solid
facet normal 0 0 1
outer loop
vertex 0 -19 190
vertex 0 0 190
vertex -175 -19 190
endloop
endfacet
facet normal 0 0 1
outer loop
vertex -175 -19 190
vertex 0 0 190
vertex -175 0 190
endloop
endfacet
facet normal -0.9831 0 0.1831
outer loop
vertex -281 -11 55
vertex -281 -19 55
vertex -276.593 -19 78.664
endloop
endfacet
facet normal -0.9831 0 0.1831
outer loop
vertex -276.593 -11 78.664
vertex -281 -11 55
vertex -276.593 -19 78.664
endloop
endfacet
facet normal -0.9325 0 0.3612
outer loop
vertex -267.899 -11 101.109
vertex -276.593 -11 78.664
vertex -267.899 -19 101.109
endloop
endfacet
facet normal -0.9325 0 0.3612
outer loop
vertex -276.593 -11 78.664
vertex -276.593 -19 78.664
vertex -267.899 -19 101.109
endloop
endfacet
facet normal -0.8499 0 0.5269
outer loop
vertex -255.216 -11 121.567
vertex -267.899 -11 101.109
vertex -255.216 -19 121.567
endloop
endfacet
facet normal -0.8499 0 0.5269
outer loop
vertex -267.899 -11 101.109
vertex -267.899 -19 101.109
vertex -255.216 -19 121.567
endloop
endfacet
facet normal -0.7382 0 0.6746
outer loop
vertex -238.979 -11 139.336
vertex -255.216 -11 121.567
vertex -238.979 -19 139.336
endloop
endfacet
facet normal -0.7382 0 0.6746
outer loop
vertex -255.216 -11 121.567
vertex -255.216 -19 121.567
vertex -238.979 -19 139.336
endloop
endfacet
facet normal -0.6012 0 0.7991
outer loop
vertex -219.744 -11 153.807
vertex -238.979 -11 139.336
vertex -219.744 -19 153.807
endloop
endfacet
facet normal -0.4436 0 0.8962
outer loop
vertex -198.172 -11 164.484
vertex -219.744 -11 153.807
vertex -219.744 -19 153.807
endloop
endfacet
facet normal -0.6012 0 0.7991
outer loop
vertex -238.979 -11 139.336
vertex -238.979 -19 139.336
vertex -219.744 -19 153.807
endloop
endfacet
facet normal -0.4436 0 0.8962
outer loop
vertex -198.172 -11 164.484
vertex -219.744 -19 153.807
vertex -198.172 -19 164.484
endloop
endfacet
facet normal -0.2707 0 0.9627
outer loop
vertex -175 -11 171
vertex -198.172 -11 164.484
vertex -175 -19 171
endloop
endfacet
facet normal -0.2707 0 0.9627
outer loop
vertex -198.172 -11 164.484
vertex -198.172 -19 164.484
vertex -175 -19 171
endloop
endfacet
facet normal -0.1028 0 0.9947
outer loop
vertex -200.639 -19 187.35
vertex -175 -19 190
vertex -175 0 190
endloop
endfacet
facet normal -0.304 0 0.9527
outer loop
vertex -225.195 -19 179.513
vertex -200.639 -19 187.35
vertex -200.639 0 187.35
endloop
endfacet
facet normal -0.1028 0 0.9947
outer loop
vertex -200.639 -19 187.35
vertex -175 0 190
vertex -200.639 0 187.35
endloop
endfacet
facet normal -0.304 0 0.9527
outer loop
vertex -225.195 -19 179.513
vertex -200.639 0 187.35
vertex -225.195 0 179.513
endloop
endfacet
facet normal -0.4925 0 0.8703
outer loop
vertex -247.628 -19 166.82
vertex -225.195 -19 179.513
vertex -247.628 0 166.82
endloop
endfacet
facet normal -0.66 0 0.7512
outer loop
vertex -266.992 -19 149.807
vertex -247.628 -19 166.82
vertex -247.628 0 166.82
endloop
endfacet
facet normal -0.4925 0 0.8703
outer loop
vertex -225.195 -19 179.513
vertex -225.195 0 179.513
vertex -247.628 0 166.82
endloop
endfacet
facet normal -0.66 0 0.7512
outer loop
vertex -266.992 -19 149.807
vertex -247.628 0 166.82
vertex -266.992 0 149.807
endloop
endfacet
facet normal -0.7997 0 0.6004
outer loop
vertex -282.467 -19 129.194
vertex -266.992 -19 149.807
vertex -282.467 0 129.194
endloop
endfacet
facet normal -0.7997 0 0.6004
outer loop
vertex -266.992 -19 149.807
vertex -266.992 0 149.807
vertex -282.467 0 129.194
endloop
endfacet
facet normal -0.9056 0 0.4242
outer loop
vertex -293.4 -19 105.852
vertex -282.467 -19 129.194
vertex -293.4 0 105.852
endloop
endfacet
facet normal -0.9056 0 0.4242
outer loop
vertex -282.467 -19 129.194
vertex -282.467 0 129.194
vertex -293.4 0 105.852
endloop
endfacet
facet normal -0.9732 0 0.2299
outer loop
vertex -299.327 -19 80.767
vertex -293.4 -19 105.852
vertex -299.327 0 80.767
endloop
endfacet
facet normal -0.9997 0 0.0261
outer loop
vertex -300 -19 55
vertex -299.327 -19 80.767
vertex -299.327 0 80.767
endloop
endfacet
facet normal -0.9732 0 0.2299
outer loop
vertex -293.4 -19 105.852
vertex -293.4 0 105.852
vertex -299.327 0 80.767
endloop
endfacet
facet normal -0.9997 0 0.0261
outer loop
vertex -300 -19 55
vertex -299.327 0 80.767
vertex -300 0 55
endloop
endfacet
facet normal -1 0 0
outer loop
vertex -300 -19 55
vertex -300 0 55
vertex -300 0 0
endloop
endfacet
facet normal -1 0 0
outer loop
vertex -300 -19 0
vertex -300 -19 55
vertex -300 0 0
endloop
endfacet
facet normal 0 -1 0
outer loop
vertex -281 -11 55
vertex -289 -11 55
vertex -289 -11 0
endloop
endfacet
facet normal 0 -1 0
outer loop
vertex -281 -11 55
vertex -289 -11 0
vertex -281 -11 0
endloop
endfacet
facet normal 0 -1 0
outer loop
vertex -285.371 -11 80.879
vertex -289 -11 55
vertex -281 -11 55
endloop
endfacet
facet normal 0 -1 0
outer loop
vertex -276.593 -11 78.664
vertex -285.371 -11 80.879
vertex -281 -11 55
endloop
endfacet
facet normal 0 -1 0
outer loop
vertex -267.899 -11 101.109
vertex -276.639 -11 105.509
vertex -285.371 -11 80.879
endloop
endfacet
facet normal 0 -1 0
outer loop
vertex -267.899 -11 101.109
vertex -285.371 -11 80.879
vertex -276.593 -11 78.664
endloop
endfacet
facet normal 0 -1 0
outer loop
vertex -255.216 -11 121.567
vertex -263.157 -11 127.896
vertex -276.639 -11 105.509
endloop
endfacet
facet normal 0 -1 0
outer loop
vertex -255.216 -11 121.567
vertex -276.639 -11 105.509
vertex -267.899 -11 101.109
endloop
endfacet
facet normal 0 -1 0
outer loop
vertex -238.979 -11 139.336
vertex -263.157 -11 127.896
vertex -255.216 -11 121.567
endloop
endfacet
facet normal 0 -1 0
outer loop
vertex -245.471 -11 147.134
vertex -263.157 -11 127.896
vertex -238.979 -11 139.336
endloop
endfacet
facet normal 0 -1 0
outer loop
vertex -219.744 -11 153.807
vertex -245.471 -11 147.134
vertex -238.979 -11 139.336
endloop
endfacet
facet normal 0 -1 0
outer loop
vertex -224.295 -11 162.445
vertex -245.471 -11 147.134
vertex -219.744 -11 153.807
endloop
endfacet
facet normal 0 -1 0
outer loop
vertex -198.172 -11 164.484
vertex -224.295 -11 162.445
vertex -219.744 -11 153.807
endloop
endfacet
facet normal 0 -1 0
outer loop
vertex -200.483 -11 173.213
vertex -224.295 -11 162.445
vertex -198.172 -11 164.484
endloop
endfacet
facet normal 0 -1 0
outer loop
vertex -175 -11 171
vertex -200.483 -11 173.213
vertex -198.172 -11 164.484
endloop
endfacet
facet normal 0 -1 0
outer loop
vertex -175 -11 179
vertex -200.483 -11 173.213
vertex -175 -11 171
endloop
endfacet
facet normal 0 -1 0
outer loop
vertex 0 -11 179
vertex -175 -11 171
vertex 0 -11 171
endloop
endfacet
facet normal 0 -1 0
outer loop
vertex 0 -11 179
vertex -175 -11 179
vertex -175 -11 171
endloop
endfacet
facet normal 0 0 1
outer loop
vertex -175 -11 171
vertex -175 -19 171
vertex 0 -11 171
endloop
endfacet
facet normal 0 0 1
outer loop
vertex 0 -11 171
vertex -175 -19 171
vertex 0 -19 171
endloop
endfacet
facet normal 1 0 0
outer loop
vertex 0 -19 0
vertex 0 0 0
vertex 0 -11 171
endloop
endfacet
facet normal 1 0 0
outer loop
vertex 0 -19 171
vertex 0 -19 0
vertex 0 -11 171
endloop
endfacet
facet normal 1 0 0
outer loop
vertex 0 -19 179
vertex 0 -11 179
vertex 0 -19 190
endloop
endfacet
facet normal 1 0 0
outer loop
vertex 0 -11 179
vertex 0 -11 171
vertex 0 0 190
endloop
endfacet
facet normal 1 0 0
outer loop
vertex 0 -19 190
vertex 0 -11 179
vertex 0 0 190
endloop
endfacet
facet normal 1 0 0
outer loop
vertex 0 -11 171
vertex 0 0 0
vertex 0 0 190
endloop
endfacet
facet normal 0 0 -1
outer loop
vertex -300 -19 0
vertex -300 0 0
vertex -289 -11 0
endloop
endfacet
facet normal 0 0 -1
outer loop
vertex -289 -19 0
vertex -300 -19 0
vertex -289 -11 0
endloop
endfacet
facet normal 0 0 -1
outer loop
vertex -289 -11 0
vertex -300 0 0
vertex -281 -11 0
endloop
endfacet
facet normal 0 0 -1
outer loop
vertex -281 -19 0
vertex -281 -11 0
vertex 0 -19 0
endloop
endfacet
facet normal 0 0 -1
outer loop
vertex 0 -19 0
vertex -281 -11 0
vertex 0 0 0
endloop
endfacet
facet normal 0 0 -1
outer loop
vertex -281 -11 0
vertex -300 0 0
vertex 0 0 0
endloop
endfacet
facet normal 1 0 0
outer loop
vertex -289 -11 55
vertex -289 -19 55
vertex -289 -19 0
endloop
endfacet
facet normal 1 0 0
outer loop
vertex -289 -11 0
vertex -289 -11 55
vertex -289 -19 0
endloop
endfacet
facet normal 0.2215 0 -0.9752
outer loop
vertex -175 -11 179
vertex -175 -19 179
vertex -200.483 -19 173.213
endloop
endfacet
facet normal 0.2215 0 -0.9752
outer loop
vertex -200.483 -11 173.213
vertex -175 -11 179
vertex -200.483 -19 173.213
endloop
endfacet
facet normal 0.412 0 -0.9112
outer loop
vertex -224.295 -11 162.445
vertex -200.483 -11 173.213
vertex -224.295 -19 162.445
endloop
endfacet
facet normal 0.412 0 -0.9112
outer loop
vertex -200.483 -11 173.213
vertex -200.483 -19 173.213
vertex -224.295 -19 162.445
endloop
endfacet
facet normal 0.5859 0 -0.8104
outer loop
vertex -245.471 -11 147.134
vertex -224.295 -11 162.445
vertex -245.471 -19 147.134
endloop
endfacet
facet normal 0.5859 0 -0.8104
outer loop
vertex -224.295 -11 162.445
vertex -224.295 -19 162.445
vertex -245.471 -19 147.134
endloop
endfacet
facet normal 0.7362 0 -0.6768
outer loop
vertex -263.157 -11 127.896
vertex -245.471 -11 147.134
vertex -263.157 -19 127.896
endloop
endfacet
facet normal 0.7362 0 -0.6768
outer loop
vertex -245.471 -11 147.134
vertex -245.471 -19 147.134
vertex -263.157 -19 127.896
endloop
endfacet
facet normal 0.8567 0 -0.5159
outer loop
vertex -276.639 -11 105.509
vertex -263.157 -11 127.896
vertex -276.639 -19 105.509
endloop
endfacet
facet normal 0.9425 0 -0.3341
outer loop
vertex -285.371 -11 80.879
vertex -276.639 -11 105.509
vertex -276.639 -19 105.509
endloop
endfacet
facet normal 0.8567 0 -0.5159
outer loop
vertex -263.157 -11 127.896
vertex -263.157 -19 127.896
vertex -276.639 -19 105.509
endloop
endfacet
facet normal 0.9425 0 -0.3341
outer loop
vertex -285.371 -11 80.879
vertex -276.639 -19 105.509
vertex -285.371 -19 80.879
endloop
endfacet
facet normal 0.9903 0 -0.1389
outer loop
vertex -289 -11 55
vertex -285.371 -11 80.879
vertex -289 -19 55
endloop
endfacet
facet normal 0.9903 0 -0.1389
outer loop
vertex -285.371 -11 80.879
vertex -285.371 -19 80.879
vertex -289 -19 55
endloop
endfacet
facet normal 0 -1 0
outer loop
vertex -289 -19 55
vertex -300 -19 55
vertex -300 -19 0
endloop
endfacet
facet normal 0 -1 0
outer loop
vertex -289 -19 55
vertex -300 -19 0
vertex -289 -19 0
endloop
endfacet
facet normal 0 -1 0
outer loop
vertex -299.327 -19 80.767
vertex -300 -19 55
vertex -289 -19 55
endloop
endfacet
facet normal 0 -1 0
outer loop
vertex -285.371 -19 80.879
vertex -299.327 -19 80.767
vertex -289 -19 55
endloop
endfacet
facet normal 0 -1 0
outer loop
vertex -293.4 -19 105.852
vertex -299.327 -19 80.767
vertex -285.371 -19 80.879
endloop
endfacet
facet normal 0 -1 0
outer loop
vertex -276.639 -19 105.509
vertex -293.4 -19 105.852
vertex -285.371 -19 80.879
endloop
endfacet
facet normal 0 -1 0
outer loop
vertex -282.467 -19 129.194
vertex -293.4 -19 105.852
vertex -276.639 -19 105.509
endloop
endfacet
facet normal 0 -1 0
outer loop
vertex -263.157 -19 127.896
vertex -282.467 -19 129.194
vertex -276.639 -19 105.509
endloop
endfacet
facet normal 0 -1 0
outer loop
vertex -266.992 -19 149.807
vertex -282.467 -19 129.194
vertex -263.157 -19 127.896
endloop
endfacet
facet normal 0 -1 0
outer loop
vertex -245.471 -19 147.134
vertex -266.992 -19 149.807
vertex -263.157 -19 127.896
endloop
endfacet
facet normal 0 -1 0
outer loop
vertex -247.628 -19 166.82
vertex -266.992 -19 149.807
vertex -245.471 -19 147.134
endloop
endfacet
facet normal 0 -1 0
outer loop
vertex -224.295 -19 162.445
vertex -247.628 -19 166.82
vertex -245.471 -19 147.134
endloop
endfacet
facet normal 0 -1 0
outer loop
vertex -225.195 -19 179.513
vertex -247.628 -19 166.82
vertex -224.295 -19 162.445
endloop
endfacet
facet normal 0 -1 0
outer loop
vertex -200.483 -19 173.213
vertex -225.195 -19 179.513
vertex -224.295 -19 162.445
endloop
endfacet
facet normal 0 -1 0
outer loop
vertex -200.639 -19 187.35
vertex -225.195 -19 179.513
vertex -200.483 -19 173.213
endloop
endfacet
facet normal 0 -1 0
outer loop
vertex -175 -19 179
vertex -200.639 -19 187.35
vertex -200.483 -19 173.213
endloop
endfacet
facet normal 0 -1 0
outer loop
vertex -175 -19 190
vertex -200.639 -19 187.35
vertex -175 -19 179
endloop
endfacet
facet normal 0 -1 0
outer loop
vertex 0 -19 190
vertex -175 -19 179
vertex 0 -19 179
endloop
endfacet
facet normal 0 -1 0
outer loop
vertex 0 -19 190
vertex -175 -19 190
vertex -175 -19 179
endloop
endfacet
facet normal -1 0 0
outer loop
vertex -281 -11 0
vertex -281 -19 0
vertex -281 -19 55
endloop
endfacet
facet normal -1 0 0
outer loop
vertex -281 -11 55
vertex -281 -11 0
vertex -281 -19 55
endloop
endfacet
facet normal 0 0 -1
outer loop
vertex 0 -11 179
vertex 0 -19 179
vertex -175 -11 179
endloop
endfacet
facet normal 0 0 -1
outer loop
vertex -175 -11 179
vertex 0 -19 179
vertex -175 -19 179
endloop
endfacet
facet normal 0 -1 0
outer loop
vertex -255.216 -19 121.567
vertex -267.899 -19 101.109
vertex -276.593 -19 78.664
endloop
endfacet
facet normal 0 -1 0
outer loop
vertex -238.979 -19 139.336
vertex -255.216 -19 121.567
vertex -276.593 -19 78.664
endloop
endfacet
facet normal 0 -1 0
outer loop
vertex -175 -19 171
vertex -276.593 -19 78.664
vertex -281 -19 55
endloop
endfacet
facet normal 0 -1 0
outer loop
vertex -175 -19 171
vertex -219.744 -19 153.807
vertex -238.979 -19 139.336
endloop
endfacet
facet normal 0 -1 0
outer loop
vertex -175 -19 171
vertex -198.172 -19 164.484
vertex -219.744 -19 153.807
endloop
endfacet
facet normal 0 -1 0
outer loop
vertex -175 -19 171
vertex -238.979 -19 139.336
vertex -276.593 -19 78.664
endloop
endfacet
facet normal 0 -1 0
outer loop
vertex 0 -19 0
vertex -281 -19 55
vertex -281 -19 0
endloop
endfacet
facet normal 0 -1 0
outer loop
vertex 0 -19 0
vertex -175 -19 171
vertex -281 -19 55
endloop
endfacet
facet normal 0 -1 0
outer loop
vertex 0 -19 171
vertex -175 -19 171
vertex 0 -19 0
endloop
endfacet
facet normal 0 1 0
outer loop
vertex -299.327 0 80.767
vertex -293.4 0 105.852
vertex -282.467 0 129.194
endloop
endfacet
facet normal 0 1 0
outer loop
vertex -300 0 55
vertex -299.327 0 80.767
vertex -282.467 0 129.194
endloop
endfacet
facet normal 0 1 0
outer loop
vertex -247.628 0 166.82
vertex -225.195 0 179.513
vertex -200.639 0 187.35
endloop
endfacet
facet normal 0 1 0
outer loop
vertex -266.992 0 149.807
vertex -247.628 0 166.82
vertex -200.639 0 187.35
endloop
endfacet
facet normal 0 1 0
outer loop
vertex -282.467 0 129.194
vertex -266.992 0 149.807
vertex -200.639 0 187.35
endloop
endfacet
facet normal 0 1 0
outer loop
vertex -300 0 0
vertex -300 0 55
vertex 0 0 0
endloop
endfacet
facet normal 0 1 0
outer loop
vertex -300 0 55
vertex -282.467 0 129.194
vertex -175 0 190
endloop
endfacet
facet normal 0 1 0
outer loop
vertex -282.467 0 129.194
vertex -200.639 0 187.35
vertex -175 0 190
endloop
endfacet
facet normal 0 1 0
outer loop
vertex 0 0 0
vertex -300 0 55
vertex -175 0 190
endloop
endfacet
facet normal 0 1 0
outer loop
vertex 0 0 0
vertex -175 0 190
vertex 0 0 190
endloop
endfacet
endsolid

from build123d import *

# Parameters (mm, degrees)
F1_DEPTH = 19
F3_DEPTH = 8


with BuildPart() as f1:
    # F0 (on Front) → F1 (new body)
    with BuildSketch(Plane.XZ):
        with BuildLine():
            ThreePointArc((-175, 190), (-266.991847, 149.807266), (-300, 55))
            Line((-300, 55), (-300, 0))
            Line((-300, 0), (0, 0))
            Line((0, 0), (0, 190))
            Line((0, 190), (-175, 190))
        make_face()
    extrude(amount=F1_DEPTH)

    # F2 (on face) → F3 (cut)
    with BuildSketch(Plane.XZ.offset(19)):
        with BuildLine():
            Line((0, 171), (0, 179))
            Line((0, 179), (-175, 179))
            ThreePointArc((-175, 179), (-254.798891, 137.960271), (-289, 55))
            Line((-289, 55), (-289, 0))
            Line((-289, 0), (-281, 0))
            Line((-281, 0), (-281, 55))
            ThreePointArc((-281, 55), (-247.509978, 130.828083), (-175, 171))
            Line((-175, 171), (0, 171))
        make_face()
    extrude(amount=-F3_DEPTH, mode=Mode.SUBTRACT)


solid = f1.part
